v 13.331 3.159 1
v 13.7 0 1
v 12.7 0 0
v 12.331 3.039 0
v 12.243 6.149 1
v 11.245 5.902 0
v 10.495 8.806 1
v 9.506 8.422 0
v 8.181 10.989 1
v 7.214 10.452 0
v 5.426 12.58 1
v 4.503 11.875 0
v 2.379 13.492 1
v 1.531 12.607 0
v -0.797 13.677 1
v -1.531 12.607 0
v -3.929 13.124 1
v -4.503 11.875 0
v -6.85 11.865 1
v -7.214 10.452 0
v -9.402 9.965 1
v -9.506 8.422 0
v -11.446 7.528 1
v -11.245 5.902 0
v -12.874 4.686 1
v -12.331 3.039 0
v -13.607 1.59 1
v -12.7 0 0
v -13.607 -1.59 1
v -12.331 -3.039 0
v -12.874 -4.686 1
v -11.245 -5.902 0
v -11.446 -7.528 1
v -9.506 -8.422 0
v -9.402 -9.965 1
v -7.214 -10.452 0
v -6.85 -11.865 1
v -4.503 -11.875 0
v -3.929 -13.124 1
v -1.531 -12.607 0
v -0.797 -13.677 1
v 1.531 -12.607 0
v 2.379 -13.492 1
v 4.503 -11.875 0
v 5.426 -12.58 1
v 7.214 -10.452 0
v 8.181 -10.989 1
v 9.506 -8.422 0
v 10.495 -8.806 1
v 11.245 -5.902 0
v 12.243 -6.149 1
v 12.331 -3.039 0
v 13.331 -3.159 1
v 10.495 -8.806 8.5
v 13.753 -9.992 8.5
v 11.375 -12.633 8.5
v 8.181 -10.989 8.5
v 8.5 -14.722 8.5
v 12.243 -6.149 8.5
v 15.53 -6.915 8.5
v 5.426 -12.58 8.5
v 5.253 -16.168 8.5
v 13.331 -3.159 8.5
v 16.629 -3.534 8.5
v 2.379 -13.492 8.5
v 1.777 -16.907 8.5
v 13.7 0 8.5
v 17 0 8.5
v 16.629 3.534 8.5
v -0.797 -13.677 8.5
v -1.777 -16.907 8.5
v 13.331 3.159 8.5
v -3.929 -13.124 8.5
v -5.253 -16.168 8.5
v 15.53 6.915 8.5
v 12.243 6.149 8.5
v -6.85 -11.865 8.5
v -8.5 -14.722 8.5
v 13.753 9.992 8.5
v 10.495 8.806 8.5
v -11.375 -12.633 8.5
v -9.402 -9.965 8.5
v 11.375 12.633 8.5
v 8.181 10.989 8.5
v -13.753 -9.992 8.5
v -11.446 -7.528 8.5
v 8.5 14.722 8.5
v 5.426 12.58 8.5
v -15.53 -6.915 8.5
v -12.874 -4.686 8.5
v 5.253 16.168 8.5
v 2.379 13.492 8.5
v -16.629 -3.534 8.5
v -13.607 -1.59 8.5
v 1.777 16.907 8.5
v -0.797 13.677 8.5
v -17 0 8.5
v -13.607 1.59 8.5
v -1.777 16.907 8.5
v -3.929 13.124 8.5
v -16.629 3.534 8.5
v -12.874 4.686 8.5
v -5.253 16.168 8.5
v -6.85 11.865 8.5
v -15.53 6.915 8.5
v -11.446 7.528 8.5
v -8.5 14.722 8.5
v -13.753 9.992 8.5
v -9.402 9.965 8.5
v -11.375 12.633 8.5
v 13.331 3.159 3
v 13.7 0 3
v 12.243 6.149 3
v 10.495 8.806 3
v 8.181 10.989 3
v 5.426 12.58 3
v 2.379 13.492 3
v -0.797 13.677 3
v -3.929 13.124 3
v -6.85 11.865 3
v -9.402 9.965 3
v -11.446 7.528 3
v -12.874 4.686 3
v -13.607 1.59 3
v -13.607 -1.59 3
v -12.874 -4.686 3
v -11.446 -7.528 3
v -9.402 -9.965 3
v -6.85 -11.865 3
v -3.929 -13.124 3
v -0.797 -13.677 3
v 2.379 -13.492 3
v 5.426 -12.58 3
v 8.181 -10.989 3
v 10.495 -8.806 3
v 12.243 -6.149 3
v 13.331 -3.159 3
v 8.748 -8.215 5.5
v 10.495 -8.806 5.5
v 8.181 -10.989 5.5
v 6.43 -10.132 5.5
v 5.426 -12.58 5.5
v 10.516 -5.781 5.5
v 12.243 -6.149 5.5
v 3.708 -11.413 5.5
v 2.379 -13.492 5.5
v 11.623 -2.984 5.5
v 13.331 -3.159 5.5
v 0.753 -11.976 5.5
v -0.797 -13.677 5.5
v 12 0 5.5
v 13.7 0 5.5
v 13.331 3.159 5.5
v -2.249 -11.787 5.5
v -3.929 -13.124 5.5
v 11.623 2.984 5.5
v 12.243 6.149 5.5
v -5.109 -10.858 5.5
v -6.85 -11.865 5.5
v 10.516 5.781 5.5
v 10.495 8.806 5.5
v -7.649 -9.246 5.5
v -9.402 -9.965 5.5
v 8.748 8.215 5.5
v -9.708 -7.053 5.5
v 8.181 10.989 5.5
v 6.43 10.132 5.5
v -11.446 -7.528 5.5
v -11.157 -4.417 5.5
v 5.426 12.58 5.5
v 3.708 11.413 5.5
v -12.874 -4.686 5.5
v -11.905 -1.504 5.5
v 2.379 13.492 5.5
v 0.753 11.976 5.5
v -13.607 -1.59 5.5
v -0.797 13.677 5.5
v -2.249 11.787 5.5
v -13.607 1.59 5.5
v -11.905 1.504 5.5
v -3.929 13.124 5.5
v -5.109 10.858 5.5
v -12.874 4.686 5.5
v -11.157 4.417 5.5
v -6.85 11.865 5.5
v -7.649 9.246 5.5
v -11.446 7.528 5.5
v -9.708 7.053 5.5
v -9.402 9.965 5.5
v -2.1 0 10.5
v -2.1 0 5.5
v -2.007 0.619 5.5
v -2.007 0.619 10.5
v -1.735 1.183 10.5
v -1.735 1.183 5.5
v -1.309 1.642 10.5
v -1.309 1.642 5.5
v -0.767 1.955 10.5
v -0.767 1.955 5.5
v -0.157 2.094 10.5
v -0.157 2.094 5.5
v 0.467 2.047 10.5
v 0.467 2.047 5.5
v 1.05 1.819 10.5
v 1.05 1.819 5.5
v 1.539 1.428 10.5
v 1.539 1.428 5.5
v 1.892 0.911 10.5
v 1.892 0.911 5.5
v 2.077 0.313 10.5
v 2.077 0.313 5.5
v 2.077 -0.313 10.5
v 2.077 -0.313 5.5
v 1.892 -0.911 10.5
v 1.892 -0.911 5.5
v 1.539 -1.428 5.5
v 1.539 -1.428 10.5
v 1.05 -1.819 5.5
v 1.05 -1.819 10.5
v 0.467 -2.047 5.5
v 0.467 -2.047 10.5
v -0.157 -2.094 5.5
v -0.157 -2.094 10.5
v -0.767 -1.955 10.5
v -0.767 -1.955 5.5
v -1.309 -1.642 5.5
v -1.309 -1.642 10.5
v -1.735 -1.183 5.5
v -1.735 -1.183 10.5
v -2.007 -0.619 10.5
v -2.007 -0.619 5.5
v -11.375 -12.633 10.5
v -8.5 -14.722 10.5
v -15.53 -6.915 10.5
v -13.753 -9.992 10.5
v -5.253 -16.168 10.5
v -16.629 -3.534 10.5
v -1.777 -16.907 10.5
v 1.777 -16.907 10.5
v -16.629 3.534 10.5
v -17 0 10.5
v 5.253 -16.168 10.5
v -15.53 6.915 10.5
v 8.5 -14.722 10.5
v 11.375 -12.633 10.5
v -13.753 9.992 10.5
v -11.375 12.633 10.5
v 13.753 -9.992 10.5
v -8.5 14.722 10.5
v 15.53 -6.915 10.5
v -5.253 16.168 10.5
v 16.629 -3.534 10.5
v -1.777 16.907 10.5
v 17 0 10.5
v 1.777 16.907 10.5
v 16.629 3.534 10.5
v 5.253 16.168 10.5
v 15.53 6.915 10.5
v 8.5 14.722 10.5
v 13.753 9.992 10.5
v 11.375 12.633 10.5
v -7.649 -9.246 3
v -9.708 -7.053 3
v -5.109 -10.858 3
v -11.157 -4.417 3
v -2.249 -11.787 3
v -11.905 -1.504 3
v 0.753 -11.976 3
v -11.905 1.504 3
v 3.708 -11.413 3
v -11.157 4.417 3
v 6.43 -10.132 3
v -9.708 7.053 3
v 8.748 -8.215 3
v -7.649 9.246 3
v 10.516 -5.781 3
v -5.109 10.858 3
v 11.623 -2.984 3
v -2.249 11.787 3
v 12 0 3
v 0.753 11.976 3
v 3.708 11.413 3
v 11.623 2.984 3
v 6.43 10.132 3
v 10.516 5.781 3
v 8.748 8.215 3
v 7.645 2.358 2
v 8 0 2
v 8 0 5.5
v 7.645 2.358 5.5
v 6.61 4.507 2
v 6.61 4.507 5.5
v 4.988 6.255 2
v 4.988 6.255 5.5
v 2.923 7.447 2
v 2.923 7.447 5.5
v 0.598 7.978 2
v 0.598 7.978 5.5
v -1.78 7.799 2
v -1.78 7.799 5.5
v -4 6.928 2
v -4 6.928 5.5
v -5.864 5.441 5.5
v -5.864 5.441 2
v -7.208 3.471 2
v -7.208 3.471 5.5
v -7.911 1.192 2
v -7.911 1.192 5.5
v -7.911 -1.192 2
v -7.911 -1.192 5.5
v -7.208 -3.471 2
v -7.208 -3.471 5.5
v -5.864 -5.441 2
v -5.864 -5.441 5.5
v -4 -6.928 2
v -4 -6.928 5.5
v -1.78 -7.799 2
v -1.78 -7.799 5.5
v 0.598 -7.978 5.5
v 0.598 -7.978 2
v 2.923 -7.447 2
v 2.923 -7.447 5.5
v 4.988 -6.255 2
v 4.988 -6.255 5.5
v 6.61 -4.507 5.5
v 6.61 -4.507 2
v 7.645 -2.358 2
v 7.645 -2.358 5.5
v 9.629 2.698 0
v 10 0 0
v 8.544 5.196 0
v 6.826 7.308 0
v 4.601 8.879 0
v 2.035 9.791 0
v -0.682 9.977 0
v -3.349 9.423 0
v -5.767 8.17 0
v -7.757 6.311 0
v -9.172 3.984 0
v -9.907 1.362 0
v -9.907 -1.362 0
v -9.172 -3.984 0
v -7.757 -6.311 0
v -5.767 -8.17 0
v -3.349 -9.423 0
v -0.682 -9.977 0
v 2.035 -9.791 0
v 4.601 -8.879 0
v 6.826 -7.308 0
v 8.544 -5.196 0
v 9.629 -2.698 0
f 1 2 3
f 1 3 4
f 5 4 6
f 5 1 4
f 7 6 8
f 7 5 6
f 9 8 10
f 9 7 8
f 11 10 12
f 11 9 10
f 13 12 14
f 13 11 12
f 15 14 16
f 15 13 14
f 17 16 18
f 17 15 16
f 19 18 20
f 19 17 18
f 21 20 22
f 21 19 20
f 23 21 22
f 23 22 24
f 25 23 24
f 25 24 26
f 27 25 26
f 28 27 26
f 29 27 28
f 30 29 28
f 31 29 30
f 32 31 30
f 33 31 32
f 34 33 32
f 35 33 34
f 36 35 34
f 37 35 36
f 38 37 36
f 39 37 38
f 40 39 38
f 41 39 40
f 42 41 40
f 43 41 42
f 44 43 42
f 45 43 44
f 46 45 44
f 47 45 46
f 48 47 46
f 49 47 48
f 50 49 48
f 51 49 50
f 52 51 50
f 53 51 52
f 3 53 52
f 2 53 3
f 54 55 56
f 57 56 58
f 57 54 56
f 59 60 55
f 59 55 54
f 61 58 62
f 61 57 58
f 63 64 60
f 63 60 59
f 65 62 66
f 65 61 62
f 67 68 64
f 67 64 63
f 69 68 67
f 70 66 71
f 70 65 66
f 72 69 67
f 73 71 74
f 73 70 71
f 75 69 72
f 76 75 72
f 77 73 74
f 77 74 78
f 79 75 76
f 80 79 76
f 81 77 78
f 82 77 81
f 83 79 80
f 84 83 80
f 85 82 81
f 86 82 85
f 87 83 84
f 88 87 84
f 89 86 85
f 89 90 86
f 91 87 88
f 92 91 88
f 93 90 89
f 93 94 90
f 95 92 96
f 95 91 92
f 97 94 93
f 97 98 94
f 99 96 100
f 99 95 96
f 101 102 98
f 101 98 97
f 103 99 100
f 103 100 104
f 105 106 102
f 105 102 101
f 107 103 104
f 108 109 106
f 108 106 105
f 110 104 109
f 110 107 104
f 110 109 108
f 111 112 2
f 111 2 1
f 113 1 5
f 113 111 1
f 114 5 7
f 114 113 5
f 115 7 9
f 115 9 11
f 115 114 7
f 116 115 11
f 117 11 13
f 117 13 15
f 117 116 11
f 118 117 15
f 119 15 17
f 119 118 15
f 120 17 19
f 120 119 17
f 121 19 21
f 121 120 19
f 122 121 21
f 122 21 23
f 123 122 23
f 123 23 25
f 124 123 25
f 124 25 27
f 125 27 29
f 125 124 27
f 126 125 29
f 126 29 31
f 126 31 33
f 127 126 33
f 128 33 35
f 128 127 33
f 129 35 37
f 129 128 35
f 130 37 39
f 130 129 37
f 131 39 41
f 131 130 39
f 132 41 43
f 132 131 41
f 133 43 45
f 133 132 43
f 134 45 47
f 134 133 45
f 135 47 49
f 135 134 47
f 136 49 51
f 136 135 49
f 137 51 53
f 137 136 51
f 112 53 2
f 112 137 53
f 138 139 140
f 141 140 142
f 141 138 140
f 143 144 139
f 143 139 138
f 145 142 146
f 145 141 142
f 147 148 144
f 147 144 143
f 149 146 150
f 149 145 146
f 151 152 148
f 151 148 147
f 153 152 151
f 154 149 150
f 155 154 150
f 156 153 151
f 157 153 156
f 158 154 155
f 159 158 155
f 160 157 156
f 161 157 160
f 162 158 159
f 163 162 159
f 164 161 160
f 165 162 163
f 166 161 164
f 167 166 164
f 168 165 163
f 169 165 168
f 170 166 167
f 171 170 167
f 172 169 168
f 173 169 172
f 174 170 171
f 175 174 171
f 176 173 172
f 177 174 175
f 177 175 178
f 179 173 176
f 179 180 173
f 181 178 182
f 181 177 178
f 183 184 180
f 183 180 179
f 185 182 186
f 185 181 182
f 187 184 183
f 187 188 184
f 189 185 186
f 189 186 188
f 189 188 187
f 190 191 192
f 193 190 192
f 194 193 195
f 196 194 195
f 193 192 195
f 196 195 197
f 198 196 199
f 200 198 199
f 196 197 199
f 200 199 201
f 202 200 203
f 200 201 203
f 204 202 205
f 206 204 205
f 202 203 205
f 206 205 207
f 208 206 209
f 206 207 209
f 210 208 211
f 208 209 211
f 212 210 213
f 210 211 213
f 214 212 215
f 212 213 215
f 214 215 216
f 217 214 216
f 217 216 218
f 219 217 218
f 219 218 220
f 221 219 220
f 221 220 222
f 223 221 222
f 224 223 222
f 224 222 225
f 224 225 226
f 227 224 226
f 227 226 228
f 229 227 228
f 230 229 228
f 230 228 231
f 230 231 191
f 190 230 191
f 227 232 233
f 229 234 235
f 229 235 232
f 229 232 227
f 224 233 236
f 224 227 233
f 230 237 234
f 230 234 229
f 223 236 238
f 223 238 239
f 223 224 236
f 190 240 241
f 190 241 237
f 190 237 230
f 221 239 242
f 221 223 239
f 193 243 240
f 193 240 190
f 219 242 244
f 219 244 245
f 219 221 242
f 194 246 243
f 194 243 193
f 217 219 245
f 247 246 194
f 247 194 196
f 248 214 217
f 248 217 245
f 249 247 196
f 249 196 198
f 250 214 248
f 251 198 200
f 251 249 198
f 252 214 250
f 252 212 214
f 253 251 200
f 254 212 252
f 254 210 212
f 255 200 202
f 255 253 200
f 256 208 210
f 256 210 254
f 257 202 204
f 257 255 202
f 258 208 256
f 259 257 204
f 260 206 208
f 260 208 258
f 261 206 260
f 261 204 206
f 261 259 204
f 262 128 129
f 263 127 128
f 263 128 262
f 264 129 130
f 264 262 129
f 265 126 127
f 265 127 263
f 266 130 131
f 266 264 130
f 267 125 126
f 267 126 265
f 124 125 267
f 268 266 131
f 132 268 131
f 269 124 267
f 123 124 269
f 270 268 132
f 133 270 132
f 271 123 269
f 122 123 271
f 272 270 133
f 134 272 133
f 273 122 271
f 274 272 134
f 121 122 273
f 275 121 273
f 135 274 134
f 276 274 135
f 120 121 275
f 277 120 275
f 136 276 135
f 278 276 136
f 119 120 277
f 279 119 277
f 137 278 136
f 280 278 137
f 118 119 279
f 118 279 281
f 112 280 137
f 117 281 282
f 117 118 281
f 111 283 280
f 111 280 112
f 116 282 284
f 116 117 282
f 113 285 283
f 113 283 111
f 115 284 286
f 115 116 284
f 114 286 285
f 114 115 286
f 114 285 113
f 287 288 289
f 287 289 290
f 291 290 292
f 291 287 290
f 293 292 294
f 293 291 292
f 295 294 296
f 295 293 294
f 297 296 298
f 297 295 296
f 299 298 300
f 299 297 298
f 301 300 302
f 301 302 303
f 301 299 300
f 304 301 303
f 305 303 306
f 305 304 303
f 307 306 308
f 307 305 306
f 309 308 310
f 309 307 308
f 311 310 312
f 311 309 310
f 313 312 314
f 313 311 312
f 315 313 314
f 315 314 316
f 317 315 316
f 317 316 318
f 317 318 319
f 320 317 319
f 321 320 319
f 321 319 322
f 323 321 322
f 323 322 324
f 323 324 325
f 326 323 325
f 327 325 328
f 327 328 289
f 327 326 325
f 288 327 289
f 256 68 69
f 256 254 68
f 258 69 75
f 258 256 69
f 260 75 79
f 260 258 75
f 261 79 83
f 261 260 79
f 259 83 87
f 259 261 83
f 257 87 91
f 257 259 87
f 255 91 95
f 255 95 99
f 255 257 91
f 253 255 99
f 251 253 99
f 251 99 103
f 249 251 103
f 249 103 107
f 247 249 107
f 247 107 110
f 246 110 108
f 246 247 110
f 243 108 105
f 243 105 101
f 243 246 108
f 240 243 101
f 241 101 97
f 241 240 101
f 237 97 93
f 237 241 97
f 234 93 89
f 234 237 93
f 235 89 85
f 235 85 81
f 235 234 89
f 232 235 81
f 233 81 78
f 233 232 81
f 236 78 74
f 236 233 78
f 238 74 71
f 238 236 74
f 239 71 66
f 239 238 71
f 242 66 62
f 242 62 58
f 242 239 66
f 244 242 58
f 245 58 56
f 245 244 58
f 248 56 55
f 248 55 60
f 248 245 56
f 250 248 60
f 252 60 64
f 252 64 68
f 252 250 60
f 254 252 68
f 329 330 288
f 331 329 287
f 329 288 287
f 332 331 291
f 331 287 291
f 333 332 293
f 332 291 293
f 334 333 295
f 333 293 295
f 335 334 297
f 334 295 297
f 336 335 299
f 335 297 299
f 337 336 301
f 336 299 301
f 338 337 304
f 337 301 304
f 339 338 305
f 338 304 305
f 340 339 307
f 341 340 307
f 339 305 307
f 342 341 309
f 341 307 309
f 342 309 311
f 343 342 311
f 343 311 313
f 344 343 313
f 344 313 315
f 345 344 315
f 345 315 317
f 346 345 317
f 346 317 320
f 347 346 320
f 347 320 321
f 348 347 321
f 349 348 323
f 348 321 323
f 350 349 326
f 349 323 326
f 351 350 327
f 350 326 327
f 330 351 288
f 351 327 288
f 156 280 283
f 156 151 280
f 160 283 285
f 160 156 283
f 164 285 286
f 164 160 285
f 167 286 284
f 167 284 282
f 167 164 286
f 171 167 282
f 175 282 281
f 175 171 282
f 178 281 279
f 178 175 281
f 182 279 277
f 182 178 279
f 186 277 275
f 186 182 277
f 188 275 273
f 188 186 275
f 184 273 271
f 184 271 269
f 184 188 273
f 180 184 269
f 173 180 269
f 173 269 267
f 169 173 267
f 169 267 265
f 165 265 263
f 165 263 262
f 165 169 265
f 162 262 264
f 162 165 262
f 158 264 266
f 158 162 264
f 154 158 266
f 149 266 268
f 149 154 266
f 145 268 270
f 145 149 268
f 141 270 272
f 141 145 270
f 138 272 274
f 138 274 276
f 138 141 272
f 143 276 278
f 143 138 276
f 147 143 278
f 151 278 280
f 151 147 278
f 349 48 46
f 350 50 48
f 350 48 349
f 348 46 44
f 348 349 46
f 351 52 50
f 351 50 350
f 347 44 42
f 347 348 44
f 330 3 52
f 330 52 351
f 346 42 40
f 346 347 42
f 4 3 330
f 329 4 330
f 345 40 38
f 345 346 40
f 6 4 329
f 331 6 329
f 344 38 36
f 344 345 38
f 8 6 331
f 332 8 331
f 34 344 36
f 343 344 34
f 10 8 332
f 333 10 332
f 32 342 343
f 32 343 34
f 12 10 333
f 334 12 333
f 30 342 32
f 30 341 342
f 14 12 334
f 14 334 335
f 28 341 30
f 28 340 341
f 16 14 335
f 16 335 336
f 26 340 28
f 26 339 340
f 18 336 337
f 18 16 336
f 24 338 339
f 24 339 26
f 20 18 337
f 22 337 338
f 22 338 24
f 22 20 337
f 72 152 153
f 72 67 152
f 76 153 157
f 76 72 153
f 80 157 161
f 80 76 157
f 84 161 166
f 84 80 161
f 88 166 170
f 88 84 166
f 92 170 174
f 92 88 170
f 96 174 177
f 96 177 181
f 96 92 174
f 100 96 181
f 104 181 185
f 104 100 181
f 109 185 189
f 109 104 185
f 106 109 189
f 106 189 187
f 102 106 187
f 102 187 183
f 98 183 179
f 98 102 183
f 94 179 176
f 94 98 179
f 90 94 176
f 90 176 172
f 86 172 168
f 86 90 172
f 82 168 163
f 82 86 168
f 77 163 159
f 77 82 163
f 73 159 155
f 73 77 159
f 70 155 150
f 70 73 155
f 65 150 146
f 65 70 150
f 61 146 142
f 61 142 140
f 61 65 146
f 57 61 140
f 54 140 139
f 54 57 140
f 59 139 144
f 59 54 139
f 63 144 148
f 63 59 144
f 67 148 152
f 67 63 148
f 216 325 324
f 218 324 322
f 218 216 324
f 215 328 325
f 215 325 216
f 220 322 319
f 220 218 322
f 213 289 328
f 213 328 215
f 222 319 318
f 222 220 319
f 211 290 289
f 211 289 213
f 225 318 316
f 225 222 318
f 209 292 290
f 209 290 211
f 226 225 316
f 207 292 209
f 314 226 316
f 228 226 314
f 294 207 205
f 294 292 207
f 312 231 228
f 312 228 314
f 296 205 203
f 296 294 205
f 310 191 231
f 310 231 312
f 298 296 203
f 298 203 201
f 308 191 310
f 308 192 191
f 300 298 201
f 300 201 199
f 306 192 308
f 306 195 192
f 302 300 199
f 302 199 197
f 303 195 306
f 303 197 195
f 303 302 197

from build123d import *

# Parameters (mm, degrees)
F3_D     = 4.2
F3_DEPTH = 10
F3_TIP   = 1.2618073
F4_SIZE  = 1
F5_SIZE  = 2


with BuildPart() as f1:
    # F0 (on Front) → F1 (revolve)
    with BuildSketch(Plane.XZ):
        Polygon((17, 10.5), (0, 10.5), (0, 5.5), (8, 5.5), (8, 0), (13.7, 0), (13.7, 3), (12, 3), (12, 5.5), (13.7, 5.5), (13.7, 8.5), (17, 8.5), align=None)
    revolve(axis=Axis((0, 0, 19.6601920579), (0, 0, 1)))

    # F3
    with Locations(Plane.XY.offset(10.5)):
        with Locations((0, 0)):
            Hole(F3_D / 2, depth=F3_DEPTH)
            with Locations((0, 0, -(F3_DEPTH + F3_TIP / 2))):  # 118° drill point
                Cone(0, F3_D / 2, F3_TIP, mode=Mode.SUBTRACT)

    # F4
    f4_edges = [f1.edges().sort_by_distance(p)[0] for p in [
        (-13.7, 0, 0),
    ]]
    chamfer(f4_edges, length=F4_SIZE)

    # F5
    f5_edges = [f1.edges().sort_by_distance(p)[0] for p in [
        (-8, 0, 0),
    ]]
    chamfer(f5_edges, length=F5_SIZE)


solid = f1.part
